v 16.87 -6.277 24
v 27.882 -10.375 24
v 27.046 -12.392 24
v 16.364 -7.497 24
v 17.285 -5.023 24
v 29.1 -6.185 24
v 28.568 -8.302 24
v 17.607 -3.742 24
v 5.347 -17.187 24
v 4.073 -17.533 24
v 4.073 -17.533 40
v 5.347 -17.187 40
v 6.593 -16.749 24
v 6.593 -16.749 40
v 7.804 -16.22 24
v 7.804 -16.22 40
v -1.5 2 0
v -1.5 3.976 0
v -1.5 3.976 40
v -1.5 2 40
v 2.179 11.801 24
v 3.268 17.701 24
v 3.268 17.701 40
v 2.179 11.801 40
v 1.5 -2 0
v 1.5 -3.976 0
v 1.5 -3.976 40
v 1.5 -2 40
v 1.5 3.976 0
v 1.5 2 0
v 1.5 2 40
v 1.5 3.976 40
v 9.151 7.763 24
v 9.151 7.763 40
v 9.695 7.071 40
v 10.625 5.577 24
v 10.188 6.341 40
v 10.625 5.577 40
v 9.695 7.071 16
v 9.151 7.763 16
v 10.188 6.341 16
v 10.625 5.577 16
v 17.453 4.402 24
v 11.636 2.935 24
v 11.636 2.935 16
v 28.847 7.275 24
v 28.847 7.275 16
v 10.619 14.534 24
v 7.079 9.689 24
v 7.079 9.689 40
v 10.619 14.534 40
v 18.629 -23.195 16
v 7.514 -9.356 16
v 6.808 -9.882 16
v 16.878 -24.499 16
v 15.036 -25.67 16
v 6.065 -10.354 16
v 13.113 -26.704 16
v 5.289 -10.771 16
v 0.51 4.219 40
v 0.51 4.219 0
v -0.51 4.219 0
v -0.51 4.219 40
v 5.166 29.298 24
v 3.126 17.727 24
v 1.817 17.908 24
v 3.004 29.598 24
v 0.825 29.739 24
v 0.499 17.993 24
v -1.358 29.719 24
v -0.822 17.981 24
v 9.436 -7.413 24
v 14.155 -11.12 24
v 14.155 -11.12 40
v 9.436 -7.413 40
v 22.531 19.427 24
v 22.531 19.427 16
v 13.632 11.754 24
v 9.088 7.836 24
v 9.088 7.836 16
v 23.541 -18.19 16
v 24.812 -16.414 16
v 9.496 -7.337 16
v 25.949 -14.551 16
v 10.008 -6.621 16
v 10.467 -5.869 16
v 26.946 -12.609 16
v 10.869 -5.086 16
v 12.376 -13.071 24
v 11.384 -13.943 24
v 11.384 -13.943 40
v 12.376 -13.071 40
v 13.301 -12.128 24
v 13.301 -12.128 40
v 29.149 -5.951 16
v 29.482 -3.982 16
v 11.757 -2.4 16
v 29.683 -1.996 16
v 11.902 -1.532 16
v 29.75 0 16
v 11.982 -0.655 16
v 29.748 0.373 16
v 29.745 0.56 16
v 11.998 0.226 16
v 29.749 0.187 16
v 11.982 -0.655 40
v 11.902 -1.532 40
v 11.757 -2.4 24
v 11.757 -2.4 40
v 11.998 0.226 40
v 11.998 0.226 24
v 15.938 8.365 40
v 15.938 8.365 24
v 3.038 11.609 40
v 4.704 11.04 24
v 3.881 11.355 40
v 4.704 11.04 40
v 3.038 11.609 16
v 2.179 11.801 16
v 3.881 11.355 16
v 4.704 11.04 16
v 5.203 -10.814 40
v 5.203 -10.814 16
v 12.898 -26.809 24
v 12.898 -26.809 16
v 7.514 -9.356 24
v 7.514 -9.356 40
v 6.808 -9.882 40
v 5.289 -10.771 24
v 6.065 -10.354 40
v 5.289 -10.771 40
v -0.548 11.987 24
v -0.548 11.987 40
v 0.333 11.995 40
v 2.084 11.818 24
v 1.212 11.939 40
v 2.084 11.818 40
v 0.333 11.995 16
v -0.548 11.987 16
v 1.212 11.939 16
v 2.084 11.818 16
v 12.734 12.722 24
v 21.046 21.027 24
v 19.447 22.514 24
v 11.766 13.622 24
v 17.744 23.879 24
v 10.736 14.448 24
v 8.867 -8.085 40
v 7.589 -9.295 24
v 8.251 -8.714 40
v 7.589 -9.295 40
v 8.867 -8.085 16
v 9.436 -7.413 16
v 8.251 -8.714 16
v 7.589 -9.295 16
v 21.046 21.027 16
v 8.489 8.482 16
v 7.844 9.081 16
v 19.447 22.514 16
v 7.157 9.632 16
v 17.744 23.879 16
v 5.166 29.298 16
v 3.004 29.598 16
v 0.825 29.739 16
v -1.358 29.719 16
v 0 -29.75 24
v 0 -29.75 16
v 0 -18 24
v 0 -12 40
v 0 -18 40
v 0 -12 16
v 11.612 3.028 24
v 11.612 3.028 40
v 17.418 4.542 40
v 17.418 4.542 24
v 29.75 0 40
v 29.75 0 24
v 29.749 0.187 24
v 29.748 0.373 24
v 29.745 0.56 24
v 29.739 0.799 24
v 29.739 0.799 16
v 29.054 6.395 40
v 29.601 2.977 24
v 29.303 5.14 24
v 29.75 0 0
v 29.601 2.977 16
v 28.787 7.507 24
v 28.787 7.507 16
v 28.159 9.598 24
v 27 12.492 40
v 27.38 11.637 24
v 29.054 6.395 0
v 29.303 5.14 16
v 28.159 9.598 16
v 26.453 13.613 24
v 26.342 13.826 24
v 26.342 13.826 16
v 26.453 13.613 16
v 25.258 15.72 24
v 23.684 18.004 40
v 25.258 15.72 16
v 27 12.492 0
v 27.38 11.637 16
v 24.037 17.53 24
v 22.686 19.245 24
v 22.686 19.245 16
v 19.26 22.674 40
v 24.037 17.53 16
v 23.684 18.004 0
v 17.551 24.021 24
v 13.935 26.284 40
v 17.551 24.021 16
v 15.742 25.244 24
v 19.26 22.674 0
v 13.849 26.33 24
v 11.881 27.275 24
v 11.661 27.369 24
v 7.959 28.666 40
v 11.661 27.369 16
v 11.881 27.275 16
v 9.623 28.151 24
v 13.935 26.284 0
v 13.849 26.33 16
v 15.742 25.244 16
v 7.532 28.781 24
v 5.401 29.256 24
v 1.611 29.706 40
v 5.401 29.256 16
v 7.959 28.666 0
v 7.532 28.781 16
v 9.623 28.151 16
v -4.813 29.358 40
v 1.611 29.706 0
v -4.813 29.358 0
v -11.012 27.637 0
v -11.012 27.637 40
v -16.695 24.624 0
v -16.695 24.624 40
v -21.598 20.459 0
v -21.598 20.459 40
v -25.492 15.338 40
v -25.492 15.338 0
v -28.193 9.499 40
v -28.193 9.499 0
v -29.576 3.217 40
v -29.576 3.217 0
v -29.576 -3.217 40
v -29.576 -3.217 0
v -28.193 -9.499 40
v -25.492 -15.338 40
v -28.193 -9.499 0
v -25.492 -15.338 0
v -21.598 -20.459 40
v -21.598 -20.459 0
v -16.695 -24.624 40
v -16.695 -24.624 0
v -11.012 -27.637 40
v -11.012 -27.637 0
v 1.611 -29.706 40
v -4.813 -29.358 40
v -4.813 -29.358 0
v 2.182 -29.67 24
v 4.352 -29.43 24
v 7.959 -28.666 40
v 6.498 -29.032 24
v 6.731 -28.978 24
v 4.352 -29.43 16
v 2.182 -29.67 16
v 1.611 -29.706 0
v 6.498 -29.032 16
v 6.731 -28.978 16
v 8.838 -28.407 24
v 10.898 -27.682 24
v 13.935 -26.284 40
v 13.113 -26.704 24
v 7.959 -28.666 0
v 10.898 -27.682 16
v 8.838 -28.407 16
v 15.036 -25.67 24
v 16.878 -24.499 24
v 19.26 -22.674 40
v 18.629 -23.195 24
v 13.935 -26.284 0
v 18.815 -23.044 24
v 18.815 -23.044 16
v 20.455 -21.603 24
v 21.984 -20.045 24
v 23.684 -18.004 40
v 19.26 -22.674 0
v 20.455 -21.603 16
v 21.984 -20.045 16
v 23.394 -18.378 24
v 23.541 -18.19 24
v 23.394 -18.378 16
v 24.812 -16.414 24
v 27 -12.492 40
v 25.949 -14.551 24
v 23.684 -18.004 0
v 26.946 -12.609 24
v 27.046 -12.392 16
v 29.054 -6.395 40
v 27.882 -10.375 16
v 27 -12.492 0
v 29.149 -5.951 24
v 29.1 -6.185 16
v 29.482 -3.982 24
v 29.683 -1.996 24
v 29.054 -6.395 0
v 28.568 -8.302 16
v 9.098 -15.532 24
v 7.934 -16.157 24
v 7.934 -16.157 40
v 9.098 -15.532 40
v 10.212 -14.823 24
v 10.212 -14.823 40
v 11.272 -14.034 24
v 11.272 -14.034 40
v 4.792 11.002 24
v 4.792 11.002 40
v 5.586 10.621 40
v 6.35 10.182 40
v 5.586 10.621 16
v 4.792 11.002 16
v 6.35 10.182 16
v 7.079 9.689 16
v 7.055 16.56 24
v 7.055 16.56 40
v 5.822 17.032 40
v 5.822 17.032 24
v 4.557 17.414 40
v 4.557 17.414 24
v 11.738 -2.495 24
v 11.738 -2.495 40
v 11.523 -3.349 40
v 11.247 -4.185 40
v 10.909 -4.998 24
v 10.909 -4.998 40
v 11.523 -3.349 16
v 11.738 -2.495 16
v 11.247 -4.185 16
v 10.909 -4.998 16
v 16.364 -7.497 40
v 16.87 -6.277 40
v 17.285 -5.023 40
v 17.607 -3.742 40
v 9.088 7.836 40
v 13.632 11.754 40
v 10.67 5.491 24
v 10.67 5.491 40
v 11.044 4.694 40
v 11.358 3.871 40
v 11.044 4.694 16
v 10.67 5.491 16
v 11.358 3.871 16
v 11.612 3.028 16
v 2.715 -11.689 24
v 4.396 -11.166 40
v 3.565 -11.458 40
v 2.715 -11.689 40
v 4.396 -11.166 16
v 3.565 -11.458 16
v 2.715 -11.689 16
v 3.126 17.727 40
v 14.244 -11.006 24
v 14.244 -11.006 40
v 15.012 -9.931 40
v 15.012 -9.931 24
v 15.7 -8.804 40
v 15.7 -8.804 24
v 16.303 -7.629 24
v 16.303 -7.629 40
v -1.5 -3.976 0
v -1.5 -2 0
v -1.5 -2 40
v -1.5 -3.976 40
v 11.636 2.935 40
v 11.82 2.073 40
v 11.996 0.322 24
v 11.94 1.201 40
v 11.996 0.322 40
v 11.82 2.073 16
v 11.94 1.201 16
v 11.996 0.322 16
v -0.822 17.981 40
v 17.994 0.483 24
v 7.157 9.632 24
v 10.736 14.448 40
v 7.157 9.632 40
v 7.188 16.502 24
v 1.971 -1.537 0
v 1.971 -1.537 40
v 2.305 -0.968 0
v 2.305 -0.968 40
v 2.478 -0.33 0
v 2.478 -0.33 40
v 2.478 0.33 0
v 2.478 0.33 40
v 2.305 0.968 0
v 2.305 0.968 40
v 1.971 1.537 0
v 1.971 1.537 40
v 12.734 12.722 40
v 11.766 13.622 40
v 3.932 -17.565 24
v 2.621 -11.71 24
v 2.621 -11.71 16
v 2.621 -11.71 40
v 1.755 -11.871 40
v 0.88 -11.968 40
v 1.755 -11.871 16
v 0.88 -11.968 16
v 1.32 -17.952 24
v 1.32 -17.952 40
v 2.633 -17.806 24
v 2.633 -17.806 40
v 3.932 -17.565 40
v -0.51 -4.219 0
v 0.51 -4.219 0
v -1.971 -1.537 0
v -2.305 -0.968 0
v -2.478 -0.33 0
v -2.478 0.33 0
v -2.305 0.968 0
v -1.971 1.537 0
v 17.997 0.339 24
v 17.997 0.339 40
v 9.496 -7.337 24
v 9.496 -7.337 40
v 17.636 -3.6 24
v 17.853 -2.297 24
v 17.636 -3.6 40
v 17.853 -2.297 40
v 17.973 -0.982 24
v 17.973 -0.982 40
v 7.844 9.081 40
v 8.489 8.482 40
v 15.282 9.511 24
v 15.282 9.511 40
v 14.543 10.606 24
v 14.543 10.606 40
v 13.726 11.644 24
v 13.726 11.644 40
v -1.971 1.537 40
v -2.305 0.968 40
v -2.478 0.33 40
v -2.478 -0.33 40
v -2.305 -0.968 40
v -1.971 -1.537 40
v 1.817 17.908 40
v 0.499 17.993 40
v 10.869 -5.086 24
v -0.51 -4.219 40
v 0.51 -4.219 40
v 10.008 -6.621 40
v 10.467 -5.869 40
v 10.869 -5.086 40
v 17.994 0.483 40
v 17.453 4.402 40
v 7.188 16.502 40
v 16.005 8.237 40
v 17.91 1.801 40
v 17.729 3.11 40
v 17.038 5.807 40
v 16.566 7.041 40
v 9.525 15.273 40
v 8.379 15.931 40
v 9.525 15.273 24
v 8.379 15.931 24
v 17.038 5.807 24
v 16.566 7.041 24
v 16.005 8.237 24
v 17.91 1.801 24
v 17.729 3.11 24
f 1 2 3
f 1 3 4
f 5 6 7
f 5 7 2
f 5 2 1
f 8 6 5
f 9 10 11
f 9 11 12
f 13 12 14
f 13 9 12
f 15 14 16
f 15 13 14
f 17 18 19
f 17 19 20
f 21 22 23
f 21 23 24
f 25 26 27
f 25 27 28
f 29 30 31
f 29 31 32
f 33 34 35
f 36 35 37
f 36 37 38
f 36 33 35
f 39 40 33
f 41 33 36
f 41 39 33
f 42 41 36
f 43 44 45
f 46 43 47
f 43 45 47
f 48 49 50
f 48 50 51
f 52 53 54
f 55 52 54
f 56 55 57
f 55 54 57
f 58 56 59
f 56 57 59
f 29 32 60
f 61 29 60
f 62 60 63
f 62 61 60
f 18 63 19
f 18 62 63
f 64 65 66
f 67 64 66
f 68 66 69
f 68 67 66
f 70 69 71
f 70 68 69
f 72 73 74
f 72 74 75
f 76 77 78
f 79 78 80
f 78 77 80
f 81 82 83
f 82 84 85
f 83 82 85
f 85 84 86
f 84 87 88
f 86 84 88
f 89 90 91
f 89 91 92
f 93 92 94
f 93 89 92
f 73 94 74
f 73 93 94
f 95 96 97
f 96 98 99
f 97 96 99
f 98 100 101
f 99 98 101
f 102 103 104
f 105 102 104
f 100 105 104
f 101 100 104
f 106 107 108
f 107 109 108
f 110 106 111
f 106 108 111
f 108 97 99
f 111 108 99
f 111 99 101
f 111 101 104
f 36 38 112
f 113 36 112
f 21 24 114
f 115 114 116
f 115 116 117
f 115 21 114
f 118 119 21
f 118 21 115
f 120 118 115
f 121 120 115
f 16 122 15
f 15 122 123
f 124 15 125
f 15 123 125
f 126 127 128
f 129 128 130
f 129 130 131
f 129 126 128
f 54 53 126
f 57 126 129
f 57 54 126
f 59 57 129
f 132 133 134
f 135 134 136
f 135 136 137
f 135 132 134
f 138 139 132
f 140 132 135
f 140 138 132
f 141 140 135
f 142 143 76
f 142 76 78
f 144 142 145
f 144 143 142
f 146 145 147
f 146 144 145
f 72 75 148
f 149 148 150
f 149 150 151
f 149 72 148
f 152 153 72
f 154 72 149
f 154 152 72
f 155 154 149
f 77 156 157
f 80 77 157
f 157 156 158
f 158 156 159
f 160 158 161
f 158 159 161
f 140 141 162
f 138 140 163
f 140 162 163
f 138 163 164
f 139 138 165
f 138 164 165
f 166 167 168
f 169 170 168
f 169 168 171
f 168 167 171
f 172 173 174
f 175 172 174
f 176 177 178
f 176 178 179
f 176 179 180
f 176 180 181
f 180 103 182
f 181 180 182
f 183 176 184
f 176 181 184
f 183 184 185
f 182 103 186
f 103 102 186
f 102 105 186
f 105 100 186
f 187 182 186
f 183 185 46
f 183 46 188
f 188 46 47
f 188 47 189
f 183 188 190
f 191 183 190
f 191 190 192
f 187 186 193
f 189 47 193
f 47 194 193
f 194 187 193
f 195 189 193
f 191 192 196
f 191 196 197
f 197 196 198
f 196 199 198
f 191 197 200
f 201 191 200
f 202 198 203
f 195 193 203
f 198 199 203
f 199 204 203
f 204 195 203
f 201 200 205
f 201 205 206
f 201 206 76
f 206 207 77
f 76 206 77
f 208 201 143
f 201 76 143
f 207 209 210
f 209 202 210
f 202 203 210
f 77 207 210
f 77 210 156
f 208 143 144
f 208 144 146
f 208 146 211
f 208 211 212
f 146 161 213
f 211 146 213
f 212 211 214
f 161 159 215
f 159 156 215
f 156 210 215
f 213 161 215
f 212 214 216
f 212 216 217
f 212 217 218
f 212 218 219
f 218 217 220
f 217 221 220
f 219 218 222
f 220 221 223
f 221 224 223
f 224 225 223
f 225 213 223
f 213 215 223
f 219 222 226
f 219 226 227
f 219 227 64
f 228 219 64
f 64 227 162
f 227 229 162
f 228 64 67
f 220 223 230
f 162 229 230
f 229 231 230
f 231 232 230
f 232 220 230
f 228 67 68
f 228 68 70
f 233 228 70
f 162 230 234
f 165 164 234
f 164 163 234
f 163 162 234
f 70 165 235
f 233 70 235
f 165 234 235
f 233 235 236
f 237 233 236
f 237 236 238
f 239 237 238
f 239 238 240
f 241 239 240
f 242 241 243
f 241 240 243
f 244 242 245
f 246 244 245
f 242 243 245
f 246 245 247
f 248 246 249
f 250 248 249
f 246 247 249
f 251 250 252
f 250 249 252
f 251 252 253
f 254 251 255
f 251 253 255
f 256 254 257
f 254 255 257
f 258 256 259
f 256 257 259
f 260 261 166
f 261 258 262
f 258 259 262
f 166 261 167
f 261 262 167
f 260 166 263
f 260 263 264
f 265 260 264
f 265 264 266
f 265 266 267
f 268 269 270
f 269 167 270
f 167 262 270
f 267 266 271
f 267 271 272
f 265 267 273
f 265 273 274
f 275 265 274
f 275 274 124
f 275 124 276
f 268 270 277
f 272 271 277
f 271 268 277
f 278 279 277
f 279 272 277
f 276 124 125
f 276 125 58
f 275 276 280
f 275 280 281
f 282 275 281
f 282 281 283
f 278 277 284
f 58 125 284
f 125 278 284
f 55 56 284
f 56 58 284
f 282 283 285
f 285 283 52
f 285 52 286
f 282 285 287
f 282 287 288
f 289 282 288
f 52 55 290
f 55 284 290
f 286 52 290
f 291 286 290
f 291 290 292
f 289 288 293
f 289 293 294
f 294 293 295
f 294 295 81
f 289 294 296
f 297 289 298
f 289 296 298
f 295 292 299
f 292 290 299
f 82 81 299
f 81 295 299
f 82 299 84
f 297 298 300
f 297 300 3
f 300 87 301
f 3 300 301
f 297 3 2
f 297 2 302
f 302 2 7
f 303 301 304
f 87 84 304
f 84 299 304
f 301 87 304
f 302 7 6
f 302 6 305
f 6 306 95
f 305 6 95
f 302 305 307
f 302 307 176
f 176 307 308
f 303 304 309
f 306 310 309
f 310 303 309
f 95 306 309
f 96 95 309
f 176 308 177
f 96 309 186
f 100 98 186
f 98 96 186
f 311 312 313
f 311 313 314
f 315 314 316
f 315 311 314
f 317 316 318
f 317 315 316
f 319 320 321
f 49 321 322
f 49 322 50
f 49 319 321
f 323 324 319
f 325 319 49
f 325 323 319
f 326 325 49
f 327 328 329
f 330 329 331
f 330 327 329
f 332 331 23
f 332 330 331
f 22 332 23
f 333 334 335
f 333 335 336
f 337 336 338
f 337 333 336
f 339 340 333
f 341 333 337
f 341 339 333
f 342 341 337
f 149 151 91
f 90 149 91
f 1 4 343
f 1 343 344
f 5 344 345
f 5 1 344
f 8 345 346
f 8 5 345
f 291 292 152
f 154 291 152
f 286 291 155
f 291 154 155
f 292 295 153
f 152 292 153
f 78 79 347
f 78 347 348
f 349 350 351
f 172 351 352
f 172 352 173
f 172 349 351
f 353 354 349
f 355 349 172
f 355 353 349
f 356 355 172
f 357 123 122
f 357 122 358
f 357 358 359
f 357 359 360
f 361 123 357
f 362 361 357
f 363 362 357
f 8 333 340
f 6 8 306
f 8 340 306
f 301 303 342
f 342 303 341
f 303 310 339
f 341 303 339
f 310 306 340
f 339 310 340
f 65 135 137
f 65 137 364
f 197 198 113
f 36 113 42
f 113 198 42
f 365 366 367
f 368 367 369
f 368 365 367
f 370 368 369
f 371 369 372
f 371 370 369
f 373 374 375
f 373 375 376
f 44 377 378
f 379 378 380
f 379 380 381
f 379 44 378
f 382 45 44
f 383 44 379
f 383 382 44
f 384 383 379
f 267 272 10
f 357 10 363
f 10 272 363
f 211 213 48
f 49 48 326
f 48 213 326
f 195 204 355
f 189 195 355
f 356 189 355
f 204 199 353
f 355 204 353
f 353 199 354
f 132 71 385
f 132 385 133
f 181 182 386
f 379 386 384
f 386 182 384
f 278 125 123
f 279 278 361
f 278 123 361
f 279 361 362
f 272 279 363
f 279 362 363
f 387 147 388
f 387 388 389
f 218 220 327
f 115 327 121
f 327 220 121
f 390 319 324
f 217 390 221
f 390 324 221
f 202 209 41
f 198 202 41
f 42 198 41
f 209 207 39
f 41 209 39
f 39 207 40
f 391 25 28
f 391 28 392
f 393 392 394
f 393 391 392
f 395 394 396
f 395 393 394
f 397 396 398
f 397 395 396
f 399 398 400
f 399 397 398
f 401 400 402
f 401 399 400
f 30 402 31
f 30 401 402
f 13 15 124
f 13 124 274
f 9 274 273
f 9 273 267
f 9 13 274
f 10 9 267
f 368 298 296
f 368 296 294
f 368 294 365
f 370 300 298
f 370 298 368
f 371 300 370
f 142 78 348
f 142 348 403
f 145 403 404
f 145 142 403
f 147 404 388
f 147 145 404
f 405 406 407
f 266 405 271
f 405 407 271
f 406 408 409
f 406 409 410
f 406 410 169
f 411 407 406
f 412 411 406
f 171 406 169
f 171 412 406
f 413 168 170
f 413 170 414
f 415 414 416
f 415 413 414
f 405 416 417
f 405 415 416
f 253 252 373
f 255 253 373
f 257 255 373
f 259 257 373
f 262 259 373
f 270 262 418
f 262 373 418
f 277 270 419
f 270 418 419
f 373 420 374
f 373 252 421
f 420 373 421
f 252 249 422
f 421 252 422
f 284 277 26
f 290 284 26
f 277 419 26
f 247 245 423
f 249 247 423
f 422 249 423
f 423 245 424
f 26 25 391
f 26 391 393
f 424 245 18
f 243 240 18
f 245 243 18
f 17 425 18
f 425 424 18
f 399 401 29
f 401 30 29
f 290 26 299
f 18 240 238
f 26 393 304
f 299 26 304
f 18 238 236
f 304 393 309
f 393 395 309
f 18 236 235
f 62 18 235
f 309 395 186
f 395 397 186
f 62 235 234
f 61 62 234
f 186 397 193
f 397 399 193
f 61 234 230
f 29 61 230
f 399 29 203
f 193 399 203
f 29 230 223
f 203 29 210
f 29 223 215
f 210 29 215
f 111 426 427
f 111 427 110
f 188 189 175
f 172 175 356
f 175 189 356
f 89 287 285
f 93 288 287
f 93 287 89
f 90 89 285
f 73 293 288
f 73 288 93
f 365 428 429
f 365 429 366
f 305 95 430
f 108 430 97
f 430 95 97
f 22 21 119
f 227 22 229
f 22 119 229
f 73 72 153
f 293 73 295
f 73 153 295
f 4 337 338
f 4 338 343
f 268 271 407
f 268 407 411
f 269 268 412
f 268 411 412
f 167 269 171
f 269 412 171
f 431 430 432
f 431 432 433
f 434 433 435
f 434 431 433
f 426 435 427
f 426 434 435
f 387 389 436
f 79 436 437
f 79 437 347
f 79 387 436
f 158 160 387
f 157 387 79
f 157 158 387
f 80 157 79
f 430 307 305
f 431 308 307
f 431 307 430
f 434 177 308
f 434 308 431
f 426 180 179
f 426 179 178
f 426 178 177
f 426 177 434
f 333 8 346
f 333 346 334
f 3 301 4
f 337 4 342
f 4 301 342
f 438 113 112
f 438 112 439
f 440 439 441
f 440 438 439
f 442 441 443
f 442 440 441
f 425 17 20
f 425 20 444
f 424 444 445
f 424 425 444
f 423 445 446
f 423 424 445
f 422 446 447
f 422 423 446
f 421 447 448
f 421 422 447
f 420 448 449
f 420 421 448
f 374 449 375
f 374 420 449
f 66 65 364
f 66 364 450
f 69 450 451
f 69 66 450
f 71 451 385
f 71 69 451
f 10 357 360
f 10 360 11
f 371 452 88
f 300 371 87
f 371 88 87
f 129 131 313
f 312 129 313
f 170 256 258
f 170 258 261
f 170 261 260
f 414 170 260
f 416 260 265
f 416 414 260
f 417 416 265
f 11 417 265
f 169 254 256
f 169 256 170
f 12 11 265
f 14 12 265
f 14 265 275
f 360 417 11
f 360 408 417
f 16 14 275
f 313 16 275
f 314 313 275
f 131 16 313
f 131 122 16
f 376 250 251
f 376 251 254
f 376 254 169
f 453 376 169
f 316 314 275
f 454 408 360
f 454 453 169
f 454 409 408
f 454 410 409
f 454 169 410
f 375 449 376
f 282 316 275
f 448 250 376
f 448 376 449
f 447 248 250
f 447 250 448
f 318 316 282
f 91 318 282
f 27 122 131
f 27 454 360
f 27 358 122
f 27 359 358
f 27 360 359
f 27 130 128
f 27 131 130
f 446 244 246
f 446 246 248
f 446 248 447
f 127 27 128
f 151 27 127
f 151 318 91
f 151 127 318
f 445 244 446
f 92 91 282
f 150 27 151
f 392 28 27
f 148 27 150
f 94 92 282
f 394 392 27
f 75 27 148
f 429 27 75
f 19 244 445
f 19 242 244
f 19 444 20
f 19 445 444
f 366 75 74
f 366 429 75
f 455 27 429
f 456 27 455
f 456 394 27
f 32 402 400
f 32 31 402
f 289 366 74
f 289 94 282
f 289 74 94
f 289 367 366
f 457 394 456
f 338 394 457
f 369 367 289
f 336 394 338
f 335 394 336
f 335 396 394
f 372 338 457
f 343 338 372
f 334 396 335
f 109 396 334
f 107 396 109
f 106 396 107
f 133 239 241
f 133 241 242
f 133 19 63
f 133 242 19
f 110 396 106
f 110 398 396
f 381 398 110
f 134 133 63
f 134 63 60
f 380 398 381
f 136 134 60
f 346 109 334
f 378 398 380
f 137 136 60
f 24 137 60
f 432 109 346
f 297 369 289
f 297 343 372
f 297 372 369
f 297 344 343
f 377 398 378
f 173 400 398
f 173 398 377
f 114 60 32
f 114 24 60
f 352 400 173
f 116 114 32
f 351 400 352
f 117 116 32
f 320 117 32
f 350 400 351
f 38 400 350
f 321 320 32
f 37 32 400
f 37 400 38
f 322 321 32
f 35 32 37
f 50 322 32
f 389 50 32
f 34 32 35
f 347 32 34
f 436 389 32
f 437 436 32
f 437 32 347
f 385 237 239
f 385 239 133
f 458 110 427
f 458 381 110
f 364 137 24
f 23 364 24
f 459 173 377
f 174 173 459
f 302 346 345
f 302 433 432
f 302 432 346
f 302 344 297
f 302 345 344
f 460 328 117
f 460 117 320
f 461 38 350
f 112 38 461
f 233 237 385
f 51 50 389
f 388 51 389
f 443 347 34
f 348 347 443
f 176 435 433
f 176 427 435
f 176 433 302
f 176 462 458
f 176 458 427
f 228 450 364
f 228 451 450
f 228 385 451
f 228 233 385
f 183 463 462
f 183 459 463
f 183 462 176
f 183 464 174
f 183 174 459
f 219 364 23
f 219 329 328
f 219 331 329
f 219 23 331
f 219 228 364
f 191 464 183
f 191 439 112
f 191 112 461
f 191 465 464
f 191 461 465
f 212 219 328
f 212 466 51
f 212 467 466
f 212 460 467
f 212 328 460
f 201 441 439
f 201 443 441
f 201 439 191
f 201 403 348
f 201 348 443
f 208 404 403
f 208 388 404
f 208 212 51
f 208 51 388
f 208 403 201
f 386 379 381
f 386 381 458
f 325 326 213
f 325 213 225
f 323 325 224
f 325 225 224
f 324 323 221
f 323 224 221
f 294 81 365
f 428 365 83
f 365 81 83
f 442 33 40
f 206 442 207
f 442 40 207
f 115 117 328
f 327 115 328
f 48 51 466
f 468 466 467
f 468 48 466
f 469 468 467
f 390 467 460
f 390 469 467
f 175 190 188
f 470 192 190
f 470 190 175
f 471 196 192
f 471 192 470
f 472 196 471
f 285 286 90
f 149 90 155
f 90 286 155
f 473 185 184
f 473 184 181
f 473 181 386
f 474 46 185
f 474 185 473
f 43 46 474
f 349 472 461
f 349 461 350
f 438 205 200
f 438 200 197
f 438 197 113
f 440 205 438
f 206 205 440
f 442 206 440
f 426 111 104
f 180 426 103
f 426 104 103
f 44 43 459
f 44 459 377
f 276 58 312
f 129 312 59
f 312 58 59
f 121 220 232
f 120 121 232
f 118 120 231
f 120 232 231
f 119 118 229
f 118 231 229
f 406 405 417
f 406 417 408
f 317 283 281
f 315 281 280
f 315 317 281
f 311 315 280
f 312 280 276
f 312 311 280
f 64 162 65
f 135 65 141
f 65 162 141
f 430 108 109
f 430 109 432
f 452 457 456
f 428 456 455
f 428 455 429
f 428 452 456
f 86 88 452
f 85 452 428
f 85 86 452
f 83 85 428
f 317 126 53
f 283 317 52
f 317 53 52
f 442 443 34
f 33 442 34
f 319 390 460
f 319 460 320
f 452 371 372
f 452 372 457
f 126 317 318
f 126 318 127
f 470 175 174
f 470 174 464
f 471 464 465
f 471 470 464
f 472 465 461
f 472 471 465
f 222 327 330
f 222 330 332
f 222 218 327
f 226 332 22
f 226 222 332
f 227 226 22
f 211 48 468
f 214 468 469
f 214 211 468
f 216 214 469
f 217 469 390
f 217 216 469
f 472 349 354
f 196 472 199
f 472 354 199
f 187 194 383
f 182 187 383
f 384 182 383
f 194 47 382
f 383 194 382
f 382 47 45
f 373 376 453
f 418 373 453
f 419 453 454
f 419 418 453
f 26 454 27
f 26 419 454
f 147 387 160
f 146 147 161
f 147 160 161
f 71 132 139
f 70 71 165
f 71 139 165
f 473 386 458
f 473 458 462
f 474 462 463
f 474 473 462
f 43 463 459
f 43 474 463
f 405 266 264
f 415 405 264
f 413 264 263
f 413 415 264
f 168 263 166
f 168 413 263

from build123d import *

# Parameters (mm, degrees)
SKETCH1_R               = 29.75
BOSS_EXTRUDE1_DEPTH     = 40
CUT_EXTRUDE1_DEPTH      = 4
CUT_EXTRUDE1_DEPTH_BACK = 4
CUT_EXTRUDE1_START      = -20
CUT_EXTRUDE3_START      = -16
CUT_EXTRUDE3_DEPTH      = 16


with BuildPart() as part:
    # Sketch1 → Boss-Extrude1 (new body)
    with BuildSketch(Plane.XY):
        Circle(SKETCH1_R)
        with BuildLine():
            Line((1.5, 2), (1.5, 3.97649343))
            ThreePointArc((1.5, 3.97649343), (0, 4.25), (-1.5, 3.97649343))
            Line((-1.5, 3.97649343), (-1.5, 2))
            ThreePointArc((-1.5, 2), (-2.5, 0), (-1.5, -2))
            Line((-1.5, -2), (-1.5, -3.97649343))
            ThreePointArc((-1.5, -3.97649343), (0, -4.25), (1.5, -3.97649343))
            Line((1.5, -3.97649343), (1.5, -2))
            ThreePointArc((1.5, -2), (2.5, 0), (1.5, 2))
        make_face(mode=Mode.SUBTRACT)
    extrude(amount=BOSS_EXTRUDE1_DEPTH)

    # Sketch2 → Cut-Extrude1 (cut, two sides: drawn at the far end of the back side and taken through both)
    with BuildSketch(Plane.XY.offset(40).offset(CUT_EXTRUDE1_START - CUT_EXTRUDE1_DEPTH_BACK)):
        with BuildLine():
            Line((2.621054601, -11.710255026), (6.498031199, -29.031673919))
            ThreePointArc((6.498031199, -29.031673919), (3.268807192, -29.569873174), (0, -29.75))
            Line((0, -29.75), (0, -12))
            ThreePointArc((0, -12), (1.318510464, -11.927343801), (2.621054601, -11.710255026))
        make_face()
        with BuildLine():
            Line((5.202633875, -10.813537847), (12.898196481, -26.808562579))
            ThreePointArc((12.898196481, -26.808562579), (9.874487797, -28.06344581), (6.731205322, -28.978498493))
            Line((6.731205322, -28.978498493), (2.715108029, -11.688806115))
            ThreePointArc((2.715108029, -11.688806115), (3.982986674, -11.319709234), (5.202633875, -10.813537847))
        make_face()
        with BuildLine():
            Line((7.514375173, -9.355969525), (18.62938845, -23.195007781))
            ThreePointArc((18.62938845, -23.195007781), (15.968021699, -25.101489657), (13.113292322, -26.704008397))
            Line((13.113292322, -26.704008397), (5.289395222, -10.771364732))
            ThreePointArc((5.289395222, -10.771364732), (6.440882702, -10.124970618), (7.514375173, -9.355969525))
        make_face()
        with BuildLine():
            Line((9.436378538, -7.413147786), (23.394355125, -18.378428885))
            ThreePointArc((23.394355125, -18.378428885), (21.233363816, -20.837628489), (18.815249924, -23.044497614))
            Line((18.815249924, -23.044497614), (7.589344507, -9.295259542))
            ThreePointArc((7.589344507, -9.295259542), (8.564718178, -8.405093844), (9.436378538, -7.413147786))
        make_face()
        with BuildLine():
            Line((10.868958019, -5.085838336), (26.945958422, -12.608640875))
            ThreePointArc((26.945958422, -12.608640875), (25.397423769, -15.493010227), (23.541342405, -18.189769041))
            Line((23.541342405, -18.189769041), (9.495667525, -7.337049697))
            ThreePointArc((9.495667525, -7.337049697), (10.244338999, -6.249281436), (10.868958019, -5.085838336))
        make_face()
        with BuildLine():
            Line((11.737811955, -2.494748588), (29.099992138, -6.184897541))
            ThreePointArc((29.099992138, -6.184897541), (28.244229893, -9.344836957), (27.046447919, -12.391616317))
            Line((27.046447919, -12.391616317), (10.909491598, -4.998299019))
            ThreePointArc((10.909491598, -4.998299019), (11.392630545, -3.769345999), (11.737811955, -2.494748588))
        make_face()
        with BuildLine():
            Line((11.997876673, 0.225732911), (29.744735918, 0.559629508))
            ThreePointArc((29.744735918, 0.559629508), (29.626130745, -2.711987667), (29.148771898, -5.95076439))
            Line((29.148771898, -5.95076439), (11.757487825, -2.400308325))
            ThreePointArc((11.757487825, -2.400308325), (11.950035931, -1.093910992), (11.997876673, 0.225732911))
        make_face()
        with BuildLine():
            Line((11.635663748, 2.934506626), (28.846749709, 7.275131011))
            ThreePointArc((28.846749709, 7.275131011), (29.471453141, 4.061520619), (29.739275948, 0.798727786))
            Line((29.739275948, 0.798727786), (11.995674332, 0.322175914))
            ThreePointArc((11.995674332, 0.322175914), (11.887644965, 1.638260418), (11.635663748, 2.934506626))
        make_face()
        with BuildLine():
            Line((10.669959589, 5.491080255), (26.452608147, 13.613303133))
            ThreePointArc((26.452608147, 13.613303133), (27.788219537, 10.624375509), (28.787333194, 7.506793428))
            Line((28.787333194, 7.506793428), (11.611697423, 3.02795029))
            ThreePointArc((11.611697423, 3.02795029), (11.208693595, 4.28546239), (10.669959589, 5.491080255))
        make_face()
        with BuildLine():
            Line((9.150851066, 7.762855451), (22.686484935, 19.245412473))
            ThreePointArc((22.686484935, 19.245412473), (24.663731933, 16.636190283), (26.342316763, 13.825514368))
            Line((26.342316763, 13.825514368), (10.625472308, 5.576678065))
            ThreePointArc((10.625472308, 5.576678065), (9.948396074, 6.710396081), (9.150851066, 7.762855451))
        make_face()
        with BuildLine():
            Line((7.157127728, 9.632005123), (17.743712492, 23.879346034))
            ThreePointArc((17.743712492, 23.879346034), (20.260043902, 21.785158276), (22.531039016, 19.427166053))
            Line((22.531039016, 19.427166053), (9.088150191, 7.83616782))
            ThreePointArc((9.088150191, 7.83616782), (8.172118549, 8.787290733), (7.157127728, 9.632005123))
        make_face()
        with BuildLine():
            Line((4.792195325, 11.001584611), (11.880650911, 27.274761849))
            ThreePointArc((11.880650911, 27.274761849), (14.805555575, 25.804224928), (17.551174341, 24.021215191))
            Line((17.551174341, 24.021215191), (7.07946528, 9.689229657))
            ThreePointArc((7.07946528, 9.689229657), (5.971988803, 10.408426862), (4.792195325, 11.001584611))
        make_face()
        with BuildLine():
            Line((2.178712609, 11.80055979), (5.401391677, 29.25555448))
            ThreePointArc((5.401391677, 29.25555448), (8.583167521, 28.484938745), (11.661006643, 27.369388449))
            Line((11.661006643, 27.369388449), (4.703599318, 11.039753324))
            ThreePointArc((4.703599318, 11.039753324), (3.462117992, 11.489723191), (2.178712609, 11.80055979))
        make_face()
        with BuildLine():
            Line((-0.547770447, 11.987491295), (-1.358014233, 29.718988834))
            ThreePointArc((-1.358014233, 29.718988834), (1.915607925, 29.68826277), (5.166033286, 29.298030652))
            Line((5.166033286, 29.298030652), (2.083778132, 11.817693036))
            ThreePointArc((2.083778132, 11.817693036), (0.772682188, 11.975097588), (-0.547770447, 11.987491295))
        make_face()
    extrude(amount=CUT_EXTRUDE1_DEPTH + CUT_EXTRUDE1_DEPTH_BACK, mode=Mode.SUBTRACT)

    # Sketch3 → Cut-Extrude3 (cut)
    with BuildSketch(Plane.XY.offset(40).offset(CUT_EXTRUDE3_START)):
        with BuildLine():
            Line((0, -12), (0, -18))
            ThreePointArc((0, -18), (1.977765696, -17.891015702), (3.931581902, -17.565382539))
            Line((3.931581902, -17.565382539), (2.621054601, -11.710255026))
            ThreePointArc((2.621054601, -11.710255026), (1.318510464, -11.927343801), (0, -12))
        make_face()
        with BuildLine():
            Line((2.715108029, -11.688806115), (4.072662044, -17.533209172))
            ThreePointArc((4.072662044, -17.533209172), (5.974480012, -16.979563852), (7.803950812, -16.22030677))
            Line((7.803950812, -16.22030677), (5.202633875, -10.813537847))
            ThreePointArc((5.202633875, -10.813537847), (3.982986674, -11.319709234), (2.715108029, -11.688806115))
        make_face()
        with BuildLine():
            Line((5.289395222, -10.771364732), (7.934092833, -16.157047098))
            ThreePointArc((7.934092833, -16.157047098), (9.661324053, -15.187455927), (11.27156276, -14.033954288))
            Line((11.27156276, -14.033954288), (7.514375173, -9.355969525))
            ThreePointArc((7.514375173, -9.355969525), (6.440882702, -10.124970618), (5.289395222, -10.771364732))
        make_face()
        with BuildLine():
            Line((7.589344507, -9.295259542), (11.384016761, -13.942889313))
            ThreePointArc((11.384016761, -13.942889313), (12.847077267, -12.607640767), (14.154567807, -11.119721679))
            Line((14.154567807, -11.119721679), (9.436378538, -7.413147786))
            ThreePointArc((9.436378538, -7.413147786), (8.564718178, -8.405093844), (7.589344507, -9.295259542))
        make_face()
        with BuildLine():
            Line((9.495667525, -7.337049697), (14.243501287, -11.005574546))
            ThreePointArc((14.243501287, -11.005574546), (15.366508499, -9.373922154), (16.303437028, -7.628757504))
            Line((16.303437028, -7.628757504), (10.868958019, -5.085838336))
            ThreePointArc((10.868958019, -5.085838336), (10.244338999, -6.249281436), (9.495667525, -7.337049697))
        make_face()
        with BuildLine():
            Line((10.909491598, -4.998299019), (16.364237396, -7.497448528))
            ThreePointArc((16.364237396, -7.497448528), (17.088945818, -5.654018999), (17.606717932, -3.742122882))
            Line((17.606717932, -3.742122882), (11.737811955, -2.494748588))
            ThreePointArc((11.737811955, -2.494748588), (11.392630545, -3.769345999), (10.909491598, -4.998299019))
        make_face()
        with BuildLine():
            Line((11.757487825, -2.400308325), (17.636231737, -3.600462488))
            ThreePointArc((17.636231737, -3.600462488), (17.925053896, -1.640866488), (17.996815009, 0.338599366))
            Line((17.996815009, 0.338599366), (11.997876673, 0.225732911))
            ThreePointArc((11.997876673, 0.225732911), (11.950035931, -1.093910992), (11.757487825, -2.400308325))
        make_face()
        with BuildLine():
            Line((11.995674332, 0.322175914), (17.993511498, 0.483263871))
            ThreePointArc((17.993511498, 0.483263871), (17.831467447, 2.457390627), (17.453495622, 4.40175994))
            Line((17.453495622, 4.40175994), (11.635663748, 2.934506626))
            ThreePointArc((11.635663748, 2.934506626), (11.887644965, 1.638260418), (11.995674332, 0.322175914))
        make_face()
        with BuildLine():
            Line((11.611697423, 3.02795029), (17.417546134, 4.541925436))
            ThreePointArc((17.417546134, 4.541925436), (16.813040392, 6.428193585), (16.004939383, 8.236620383))
            Line((16.004939383, 8.236620383), (10.669959589, 5.491080255))
            ThreePointArc((10.669959589, 5.491080255), (11.208693595, 4.28546239), (11.611697423, 3.02795029))
        make_face()
        with BuildLine():
            Line((10.625472308, 5.576678065), (15.938208462, 8.365017097))
            ThreePointArc((15.938208462, 8.365017097), (14.922594111, 10.065594121), (13.7262766, 11.644283177))
            Line((13.7262766, 11.644283177), (9.150851066, 7.762855451))
            ThreePointArc((9.150851066, 7.762855451), (9.948396074, 6.710396081), (10.625472308, 5.576678065))
        make_face()
        with BuildLine():
            Line((9.088150191, 7.83616782), (13.632225287, 11.75425173))
            ThreePointArc((13.632225287, 11.75425173), (12.258177823, 13.1809361), (10.735691592, 14.448007684))
            Line((10.735691592, 14.448007684), (7.157127728, 9.632005123))
            ThreePointArc((7.157127728, 9.632005123), (8.172118549, 8.787290733), (9.088150191, 7.83616782))
        make_face()
        with BuildLine():
            Line((7.07946528, 9.689229657), (10.61919792, 14.533844485))
            ThreePointArc((10.61919792, 14.533844485), (8.957983205, 15.612640292), (7.188292988, 16.502376917))
            Line((7.188292988, 16.502376917), (4.792195325, 11.001584611))
            ThreePointArc((4.792195325, 11.001584611), (5.971988803, 10.408426862), (7.07946528, 9.689229657))
        make_face()
        with BuildLine():
            Line((4.703599318, 11.039753324), (7.055398977, 16.559629986))
            ThreePointArc((7.055398977, 16.559629986), (5.193176987, 17.234584787), (3.268068914, 17.700839686))
            Line((3.268068914, 17.700839686), (2.178712609, 11.80055979))
            ThreePointArc((2.178712609, 11.80055979), (3.462117992, 11.489723191), (4.703599318, 11.039753324))
        make_face()
        with BuildLine():
            Line((2.083778132, 11.817693036), (3.125667198, 17.726539554))
            ThreePointArc((3.125667198, 17.726539554), (1.159023282, 17.962646382), (-0.821655671, 17.981236942))
            Line((-0.821655671, 17.981236942), (-0.547770447, 11.987491295))
            ThreePointArc((-0.547770447, 11.987491295), (0.772682188, 11.975097588), (2.083778132, 11.817693036))
        make_face()
    extrude(amount=CUT_EXTRUDE3_DEPTH, mode=Mode.SUBTRACT)


solid = part.part
